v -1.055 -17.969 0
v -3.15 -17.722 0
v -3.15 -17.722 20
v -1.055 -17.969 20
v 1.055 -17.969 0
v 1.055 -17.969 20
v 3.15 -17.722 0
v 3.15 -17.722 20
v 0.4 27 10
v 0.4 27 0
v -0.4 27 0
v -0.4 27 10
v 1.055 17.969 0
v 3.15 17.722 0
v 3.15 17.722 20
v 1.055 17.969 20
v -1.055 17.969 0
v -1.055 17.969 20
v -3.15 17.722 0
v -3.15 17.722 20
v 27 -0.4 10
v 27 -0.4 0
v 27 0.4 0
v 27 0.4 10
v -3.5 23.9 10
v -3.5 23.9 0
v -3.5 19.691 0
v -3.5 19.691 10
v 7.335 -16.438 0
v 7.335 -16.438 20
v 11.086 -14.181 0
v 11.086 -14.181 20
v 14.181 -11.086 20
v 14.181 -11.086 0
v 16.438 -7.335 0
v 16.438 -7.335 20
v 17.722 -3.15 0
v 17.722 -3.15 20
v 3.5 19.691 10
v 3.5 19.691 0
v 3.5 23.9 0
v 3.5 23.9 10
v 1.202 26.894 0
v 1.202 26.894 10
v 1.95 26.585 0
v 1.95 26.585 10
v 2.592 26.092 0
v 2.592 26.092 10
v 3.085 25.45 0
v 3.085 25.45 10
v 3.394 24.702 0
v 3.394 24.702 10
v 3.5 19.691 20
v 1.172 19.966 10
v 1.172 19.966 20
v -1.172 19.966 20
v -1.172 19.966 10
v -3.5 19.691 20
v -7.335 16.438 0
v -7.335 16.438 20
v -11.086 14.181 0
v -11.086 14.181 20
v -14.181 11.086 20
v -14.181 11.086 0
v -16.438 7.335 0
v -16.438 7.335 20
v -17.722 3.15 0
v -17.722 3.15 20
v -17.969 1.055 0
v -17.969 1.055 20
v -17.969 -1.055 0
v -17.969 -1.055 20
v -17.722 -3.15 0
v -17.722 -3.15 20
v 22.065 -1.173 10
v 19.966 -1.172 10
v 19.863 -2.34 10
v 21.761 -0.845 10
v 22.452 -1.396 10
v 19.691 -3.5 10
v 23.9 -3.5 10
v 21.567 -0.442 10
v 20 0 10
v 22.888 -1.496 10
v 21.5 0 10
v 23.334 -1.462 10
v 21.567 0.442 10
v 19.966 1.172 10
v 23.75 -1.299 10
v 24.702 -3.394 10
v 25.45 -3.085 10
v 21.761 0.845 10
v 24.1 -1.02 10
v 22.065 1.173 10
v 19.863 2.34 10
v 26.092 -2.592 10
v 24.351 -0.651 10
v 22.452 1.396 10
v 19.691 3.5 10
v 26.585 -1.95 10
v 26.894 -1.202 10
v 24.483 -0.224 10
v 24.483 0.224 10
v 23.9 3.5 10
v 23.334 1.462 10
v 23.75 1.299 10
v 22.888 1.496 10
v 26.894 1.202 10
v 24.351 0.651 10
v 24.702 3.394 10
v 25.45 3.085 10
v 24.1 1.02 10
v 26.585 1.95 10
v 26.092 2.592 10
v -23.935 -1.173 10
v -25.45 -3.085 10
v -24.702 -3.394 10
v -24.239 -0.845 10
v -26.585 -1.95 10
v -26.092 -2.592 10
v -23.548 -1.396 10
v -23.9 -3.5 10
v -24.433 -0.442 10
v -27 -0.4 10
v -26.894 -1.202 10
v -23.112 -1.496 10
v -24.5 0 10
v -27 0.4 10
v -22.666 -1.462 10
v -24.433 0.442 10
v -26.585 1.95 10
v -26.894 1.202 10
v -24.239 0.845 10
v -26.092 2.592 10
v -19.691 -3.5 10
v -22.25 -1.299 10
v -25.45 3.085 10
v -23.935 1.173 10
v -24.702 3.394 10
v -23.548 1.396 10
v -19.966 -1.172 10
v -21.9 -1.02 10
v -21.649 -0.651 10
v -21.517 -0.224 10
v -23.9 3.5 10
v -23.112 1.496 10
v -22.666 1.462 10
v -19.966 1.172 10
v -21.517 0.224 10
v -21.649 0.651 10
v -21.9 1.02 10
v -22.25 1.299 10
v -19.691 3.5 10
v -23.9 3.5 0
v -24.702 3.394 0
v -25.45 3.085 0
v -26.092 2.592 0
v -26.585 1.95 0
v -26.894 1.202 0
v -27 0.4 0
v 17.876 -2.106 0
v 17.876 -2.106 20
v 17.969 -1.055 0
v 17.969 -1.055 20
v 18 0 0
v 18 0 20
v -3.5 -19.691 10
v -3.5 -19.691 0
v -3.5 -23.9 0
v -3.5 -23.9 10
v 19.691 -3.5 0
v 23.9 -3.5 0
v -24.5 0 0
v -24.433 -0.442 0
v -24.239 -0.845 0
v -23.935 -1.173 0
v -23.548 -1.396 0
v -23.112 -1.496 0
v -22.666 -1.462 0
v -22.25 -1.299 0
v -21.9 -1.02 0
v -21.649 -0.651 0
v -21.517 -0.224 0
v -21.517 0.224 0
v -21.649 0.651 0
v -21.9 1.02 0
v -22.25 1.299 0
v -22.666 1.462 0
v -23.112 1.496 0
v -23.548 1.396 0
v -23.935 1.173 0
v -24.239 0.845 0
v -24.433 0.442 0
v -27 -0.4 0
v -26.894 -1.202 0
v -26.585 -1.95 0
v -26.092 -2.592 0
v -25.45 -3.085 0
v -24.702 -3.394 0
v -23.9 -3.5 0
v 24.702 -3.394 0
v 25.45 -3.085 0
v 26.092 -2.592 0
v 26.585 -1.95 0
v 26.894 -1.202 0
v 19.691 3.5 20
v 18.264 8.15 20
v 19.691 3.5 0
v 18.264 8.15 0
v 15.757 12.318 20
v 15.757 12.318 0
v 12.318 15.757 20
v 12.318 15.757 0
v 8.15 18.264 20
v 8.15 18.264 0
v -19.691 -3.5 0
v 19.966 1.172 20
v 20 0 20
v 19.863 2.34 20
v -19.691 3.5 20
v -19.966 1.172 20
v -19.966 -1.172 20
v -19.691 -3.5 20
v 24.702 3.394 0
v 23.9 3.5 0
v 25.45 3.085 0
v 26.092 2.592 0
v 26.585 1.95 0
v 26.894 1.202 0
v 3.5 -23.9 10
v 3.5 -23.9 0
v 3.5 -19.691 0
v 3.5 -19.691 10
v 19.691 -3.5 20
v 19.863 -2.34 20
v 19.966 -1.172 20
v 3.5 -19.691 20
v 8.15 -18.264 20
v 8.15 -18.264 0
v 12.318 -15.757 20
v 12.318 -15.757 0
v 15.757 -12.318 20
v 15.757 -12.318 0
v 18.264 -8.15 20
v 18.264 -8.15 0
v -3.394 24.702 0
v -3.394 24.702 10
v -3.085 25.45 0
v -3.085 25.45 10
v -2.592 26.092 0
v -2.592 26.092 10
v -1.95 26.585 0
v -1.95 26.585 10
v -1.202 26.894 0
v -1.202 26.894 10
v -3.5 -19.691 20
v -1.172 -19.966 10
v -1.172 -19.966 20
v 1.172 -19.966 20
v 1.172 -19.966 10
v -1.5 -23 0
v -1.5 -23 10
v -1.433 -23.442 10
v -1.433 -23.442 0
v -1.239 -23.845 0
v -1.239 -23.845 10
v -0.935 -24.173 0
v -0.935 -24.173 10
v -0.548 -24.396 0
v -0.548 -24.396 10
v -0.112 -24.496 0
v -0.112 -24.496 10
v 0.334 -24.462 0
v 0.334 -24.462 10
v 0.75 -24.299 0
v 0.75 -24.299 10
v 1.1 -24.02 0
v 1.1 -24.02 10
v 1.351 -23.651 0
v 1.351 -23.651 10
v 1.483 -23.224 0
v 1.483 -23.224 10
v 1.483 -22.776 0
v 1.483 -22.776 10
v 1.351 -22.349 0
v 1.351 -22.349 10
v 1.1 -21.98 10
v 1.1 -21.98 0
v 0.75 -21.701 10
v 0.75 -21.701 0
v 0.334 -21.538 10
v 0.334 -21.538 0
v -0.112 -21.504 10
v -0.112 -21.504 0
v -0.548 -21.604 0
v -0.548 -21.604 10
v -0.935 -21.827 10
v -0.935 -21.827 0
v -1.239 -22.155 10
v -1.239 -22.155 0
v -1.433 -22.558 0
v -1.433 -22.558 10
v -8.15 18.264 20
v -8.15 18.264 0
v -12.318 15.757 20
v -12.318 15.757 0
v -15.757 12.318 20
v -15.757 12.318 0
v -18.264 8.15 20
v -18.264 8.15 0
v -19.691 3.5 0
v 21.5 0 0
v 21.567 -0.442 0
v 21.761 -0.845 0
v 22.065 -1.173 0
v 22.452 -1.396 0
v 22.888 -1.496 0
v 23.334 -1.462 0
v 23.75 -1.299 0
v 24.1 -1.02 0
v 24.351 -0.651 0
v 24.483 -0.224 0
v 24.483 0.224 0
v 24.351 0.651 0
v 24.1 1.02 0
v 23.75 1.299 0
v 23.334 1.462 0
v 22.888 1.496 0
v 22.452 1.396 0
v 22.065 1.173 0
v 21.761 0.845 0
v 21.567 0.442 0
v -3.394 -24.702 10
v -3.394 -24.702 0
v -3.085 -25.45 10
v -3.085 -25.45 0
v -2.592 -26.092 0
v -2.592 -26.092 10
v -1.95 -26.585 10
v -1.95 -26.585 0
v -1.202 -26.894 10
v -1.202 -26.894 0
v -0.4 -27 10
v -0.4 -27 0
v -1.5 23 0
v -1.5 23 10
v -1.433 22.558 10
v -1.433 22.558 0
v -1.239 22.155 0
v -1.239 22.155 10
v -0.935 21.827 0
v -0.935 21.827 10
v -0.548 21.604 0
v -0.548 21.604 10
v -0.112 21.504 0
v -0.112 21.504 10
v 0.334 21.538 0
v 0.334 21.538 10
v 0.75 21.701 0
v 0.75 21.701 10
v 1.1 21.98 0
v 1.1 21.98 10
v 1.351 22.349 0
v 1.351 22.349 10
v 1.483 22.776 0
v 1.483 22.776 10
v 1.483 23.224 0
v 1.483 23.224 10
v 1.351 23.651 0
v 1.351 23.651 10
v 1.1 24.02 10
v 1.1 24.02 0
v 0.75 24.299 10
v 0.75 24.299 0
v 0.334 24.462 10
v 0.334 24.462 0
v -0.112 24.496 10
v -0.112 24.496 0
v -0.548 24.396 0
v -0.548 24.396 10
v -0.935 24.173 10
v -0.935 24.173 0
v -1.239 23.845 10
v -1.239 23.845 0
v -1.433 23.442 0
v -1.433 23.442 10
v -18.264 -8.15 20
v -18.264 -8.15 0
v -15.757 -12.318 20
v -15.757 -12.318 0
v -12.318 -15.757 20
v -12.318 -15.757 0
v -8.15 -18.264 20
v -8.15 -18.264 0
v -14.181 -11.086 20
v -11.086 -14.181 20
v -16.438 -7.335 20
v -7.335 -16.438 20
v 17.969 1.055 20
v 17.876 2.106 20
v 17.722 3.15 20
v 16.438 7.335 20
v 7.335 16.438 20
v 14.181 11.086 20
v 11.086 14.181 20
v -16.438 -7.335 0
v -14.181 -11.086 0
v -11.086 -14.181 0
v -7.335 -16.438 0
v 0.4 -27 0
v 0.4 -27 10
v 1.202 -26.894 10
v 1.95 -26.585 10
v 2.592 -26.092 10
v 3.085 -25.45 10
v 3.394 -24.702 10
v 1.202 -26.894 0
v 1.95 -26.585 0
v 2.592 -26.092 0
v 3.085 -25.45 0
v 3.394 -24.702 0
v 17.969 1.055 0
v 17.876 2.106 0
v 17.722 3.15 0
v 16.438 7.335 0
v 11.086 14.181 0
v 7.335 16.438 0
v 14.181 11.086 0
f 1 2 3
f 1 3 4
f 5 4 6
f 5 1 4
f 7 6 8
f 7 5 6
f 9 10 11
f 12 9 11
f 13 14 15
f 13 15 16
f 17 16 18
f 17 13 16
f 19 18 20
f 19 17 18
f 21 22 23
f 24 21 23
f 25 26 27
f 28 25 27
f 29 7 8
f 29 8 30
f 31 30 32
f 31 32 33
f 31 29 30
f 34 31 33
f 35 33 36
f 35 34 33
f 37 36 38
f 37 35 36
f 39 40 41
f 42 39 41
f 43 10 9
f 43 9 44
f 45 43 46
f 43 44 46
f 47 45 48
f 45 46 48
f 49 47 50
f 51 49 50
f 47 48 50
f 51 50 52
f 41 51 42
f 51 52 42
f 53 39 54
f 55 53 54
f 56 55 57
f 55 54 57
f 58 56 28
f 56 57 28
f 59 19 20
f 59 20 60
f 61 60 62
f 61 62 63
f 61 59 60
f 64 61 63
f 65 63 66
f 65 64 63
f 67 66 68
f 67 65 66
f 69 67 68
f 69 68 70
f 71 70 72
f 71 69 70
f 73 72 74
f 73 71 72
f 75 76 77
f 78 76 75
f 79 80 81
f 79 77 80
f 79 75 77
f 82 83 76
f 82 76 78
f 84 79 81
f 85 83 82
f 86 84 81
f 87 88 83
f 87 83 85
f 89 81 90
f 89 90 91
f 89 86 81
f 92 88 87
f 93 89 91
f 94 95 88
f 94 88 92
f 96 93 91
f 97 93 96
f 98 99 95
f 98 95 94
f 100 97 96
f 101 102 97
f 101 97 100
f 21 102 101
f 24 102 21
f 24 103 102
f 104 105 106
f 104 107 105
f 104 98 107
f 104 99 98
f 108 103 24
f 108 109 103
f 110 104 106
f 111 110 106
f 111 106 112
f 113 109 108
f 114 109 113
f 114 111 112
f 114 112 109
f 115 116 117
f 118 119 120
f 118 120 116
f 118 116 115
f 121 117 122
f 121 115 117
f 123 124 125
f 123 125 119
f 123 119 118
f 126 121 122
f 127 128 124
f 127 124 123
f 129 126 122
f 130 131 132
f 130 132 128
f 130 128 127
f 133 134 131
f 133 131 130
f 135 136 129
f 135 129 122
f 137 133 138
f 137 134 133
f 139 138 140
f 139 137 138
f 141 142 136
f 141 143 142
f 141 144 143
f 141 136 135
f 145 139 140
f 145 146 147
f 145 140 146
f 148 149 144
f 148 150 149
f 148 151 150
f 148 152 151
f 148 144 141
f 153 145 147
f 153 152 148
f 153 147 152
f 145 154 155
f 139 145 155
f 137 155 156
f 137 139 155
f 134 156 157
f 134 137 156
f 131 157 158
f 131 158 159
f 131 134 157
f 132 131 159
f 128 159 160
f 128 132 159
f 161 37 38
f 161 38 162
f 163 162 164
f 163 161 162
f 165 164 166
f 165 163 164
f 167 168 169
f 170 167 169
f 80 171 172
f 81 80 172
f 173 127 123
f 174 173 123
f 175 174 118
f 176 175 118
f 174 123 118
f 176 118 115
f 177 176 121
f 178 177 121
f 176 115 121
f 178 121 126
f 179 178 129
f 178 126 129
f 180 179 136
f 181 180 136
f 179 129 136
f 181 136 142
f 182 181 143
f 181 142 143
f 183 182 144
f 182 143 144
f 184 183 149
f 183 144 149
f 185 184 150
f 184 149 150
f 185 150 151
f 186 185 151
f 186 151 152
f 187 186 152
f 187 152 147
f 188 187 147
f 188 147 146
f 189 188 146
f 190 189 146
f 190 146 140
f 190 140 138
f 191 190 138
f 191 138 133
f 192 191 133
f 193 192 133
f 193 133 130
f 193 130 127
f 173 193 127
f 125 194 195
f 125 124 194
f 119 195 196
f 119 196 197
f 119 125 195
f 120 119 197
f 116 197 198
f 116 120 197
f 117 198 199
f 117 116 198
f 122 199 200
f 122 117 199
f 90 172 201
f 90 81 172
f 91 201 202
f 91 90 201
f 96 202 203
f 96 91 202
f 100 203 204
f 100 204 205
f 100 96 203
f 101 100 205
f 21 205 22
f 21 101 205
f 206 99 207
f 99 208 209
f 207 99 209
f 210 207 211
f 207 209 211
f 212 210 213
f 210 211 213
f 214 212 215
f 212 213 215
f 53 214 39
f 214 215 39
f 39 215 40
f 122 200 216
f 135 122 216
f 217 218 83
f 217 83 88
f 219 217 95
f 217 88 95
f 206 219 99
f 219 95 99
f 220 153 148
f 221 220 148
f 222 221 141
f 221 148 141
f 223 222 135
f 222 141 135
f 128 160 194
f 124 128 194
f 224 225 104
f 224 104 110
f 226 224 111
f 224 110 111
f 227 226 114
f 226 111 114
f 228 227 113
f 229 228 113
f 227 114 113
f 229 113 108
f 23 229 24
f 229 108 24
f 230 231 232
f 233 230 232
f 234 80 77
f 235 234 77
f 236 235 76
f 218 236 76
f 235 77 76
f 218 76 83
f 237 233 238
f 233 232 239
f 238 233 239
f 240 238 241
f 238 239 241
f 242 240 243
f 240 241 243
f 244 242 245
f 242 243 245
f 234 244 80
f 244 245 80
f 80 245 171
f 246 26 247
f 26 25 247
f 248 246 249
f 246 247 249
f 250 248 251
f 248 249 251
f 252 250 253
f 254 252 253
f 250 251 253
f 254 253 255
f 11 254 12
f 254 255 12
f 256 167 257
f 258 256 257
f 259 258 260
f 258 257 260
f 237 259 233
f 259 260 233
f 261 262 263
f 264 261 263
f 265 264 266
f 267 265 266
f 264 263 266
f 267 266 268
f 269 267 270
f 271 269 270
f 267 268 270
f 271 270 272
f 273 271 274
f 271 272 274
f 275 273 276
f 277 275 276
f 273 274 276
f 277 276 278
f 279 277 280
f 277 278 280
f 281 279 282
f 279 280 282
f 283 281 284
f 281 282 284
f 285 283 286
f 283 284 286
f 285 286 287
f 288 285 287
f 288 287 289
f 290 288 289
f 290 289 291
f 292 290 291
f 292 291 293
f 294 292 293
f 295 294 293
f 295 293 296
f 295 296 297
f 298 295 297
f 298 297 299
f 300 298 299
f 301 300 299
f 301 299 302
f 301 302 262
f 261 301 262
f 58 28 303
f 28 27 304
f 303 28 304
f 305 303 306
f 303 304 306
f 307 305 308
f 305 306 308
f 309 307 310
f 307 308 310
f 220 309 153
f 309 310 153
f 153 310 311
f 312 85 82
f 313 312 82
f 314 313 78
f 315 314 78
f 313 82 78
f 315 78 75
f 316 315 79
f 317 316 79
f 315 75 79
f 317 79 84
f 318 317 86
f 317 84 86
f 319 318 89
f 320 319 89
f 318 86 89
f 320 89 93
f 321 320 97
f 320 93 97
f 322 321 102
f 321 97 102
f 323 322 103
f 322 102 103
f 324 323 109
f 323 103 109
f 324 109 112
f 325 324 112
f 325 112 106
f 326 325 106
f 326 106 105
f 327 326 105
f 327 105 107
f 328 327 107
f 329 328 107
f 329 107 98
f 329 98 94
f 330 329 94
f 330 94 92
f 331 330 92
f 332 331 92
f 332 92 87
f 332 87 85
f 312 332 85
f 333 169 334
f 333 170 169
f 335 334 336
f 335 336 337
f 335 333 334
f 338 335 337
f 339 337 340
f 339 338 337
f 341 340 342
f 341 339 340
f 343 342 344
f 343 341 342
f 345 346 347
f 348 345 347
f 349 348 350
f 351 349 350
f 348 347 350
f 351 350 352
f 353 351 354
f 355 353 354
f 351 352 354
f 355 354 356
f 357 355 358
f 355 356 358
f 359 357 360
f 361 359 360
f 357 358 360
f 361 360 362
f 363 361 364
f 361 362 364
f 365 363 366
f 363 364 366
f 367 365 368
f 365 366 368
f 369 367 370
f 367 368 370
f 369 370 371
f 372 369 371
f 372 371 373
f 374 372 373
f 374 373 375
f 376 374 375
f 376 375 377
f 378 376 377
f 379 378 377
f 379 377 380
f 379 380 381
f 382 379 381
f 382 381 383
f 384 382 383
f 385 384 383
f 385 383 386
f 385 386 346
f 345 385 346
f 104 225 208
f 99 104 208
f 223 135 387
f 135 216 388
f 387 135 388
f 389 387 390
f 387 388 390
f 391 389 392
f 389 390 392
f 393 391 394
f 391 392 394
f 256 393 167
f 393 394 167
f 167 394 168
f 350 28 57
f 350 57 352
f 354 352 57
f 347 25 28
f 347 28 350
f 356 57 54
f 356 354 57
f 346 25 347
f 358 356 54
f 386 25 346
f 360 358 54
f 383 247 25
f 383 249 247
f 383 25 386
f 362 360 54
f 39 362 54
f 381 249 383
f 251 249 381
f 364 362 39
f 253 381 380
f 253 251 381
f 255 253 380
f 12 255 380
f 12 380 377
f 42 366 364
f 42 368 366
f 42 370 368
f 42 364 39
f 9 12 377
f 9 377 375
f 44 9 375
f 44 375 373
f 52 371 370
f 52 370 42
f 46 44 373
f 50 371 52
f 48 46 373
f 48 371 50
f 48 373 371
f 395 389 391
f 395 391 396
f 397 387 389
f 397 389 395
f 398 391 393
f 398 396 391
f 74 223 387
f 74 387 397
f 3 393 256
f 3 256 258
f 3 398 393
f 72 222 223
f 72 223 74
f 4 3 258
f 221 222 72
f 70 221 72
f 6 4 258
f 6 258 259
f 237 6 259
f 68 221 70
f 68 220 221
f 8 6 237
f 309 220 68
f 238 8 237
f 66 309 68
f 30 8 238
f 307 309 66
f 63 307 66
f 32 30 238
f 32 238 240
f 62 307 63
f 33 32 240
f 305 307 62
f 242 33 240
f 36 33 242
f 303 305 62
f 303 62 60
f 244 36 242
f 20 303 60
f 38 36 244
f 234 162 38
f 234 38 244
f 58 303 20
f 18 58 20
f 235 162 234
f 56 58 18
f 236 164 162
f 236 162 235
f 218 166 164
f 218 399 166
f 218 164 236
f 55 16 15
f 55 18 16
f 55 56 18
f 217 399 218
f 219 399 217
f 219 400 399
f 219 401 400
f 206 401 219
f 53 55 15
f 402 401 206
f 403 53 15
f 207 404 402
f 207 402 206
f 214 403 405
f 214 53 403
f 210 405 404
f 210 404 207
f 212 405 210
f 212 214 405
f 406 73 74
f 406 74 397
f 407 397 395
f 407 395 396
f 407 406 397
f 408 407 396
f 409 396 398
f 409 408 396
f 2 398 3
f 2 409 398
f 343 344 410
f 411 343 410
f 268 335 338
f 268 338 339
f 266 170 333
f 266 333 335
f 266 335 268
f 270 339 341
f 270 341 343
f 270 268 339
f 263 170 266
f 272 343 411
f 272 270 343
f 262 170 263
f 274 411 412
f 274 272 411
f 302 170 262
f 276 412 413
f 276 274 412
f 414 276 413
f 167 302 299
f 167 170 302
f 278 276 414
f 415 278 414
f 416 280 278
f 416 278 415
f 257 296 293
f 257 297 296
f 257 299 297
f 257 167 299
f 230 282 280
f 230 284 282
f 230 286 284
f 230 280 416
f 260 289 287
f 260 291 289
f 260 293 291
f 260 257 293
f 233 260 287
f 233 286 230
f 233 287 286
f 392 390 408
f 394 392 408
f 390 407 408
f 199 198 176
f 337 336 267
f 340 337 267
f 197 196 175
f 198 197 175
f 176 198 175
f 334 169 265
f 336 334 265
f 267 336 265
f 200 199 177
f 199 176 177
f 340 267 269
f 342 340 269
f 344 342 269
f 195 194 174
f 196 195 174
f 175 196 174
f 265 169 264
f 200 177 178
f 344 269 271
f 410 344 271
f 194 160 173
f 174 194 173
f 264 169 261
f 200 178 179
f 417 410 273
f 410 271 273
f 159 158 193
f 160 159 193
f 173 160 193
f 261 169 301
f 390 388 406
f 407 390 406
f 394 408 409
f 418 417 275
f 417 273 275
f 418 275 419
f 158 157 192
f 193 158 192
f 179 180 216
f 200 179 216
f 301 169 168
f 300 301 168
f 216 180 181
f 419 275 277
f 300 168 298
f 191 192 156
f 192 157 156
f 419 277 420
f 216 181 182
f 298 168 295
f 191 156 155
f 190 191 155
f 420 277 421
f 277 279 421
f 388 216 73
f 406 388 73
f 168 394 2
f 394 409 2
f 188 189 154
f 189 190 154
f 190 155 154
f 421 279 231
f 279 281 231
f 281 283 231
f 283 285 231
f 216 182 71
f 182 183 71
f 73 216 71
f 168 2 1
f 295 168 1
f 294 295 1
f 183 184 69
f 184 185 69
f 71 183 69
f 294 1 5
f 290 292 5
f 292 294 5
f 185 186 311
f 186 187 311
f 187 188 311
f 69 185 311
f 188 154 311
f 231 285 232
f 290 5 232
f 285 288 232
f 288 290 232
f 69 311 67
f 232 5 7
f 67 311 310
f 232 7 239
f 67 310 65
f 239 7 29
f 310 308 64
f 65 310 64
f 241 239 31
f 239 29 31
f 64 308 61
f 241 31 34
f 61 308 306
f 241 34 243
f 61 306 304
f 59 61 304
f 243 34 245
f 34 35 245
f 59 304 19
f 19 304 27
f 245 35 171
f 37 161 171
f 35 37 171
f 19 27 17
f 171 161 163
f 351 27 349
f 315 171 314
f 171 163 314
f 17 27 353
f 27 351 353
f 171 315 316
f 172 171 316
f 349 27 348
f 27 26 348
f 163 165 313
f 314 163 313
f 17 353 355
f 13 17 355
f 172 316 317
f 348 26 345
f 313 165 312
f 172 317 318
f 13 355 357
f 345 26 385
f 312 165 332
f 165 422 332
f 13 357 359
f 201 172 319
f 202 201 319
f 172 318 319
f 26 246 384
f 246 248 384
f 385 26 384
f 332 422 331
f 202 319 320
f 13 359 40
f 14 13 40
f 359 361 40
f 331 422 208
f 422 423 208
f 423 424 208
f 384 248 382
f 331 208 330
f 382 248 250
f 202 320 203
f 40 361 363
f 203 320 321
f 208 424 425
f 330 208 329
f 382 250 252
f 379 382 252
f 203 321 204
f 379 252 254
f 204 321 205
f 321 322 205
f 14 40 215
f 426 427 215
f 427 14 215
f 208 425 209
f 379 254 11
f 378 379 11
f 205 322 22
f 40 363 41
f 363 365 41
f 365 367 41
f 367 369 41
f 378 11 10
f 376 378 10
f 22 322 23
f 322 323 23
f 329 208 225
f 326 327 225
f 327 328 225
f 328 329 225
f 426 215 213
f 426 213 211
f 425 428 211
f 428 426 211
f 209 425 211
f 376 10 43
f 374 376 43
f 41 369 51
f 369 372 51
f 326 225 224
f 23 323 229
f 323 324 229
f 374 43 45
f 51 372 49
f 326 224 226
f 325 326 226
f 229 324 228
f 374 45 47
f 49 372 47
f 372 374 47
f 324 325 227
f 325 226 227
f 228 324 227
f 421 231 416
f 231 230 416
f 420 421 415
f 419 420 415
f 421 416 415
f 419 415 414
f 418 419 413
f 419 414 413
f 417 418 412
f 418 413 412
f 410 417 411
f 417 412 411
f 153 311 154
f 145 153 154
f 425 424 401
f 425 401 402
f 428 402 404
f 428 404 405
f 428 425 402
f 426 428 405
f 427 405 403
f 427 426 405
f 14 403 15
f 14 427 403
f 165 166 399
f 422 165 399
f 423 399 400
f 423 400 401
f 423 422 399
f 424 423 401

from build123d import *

# Parameters (mm, degrees)
F1_DEPTH = 20
F2_T     = -2
F3_DEPTH = 10
F4_R     = 3.1
F5_D     = 3


with BuildPart() as f1:
    # F0 (on Top) → F1 (new body)
    with BuildSketch(Plane.XY):
        with BuildLine():
            ThreePointArc((19.691369, -3.5), (19.922693, -1.756791), (20, 0))
            ThreePointArc((20, 0), (19.922693, 1.756791), (19.691369, 3.5))
            ThreePointArc((19.691369, 3.5), (14.142136, 14.142136), (3.5, 19.691369))
            ThreePointArc((3.5, 19.691369), (0, 20), (-3.5, 19.691369))
            ThreePointArc((-3.5, 19.691369), (-14.142136, 14.142136), (-19.691369, 3.5))
            ThreePointArc((-19.691369, 3.5), (-20, 0), (-19.691369, -3.5))
            ThreePointArc((-19.691369, -3.5), (-14.142136, -14.142136), (-3.5, -19.691369))
            ThreePointArc((-3.5, -19.691369), (0, -20), (3.5, -19.691369))
            ThreePointArc((3.5, -19.691369), (14.142136, -14.142136), (19.691369, -3.5))
        make_face()
    extrude(amount=F1_DEPTH)

    # F2
    f2_openings = [f1.faces().sort_by_distance(p)[0] for p in [
        (0, 0, 20),
        (0, 0, 0),
    ]]
    offset(amount=F2_T, openings=f2_openings)

    # F0 (on Top) → F3 (join)
    with BuildSketch(Plane.XY):
        with BuildLine():
            ThreePointArc((-19.691369, -3.5), (-20, 0), (-19.691369, 3.5))
            Line((-19.691369, 3.5), (-27, 3.5))
            Line((-27, 3.5), (-27, -3.5))
            Line((-27, -3.5), (-19.691369, -3.5))
        make_face()
        with BuildLine():
            ThreePointArc((-3.5, 19.691369), (0, 20), (3.5, 19.691369))
            Line((3.5, 19.691369), (3.5, 27))
            Line((3.5, 27), (-3.5, 27))
            Line((-3.5, 27), (-3.5, 19.691369))
        make_face()
        with BuildLine():
            ThreePointArc((19.691369, 3.5), (19.922693, 1.756791), (20, 0))
            ThreePointArc((20, 0), (19.922693, -1.756791), (19.691369, -3.5))
            Line((19.691369, -3.5), (27, -3.5))
            Line((27, -3.5), (27, 3.5))
            Line((27, 3.5), (19.691369, 3.5))
        make_face()
        with BuildLine():
            Line((3.5, -27), (3.5, -19.691369))
            ThreePointArc((3.5, -19.691369), (0, -20), (-3.5, -19.691369))
            Line((-3.5, -19.691369), (-3.5, -27))
            Line((-3.5, -27), (3.5, -27))
        make_face()
    extrude(amount=F3_DEPTH)

    # F4
    f4_edges = [f1.edges().sort_by_distance(p)[0] for p in [
        (27, 3.5, 5),
        (27, -3.5, 5),
        (3.5, 27, 5),
        (3.5, -27, 5),
        (-27, -3.5, 5),
        (-3.5, -27, 5),
        (-27, 3.5, 5),
        (-3.5, 27, 5),
    ]]
    fillet(f4_edges, radius=F4_R)

    # F5 (through all)
    with Locations(Plane(origin=(0, 0, 0), x_dir=(1, 0, 0), z_dir=(0, 0, -1))):
        with Locations((23, 0), (0, -23), (-23, 0), (0, 23)):
            Hole(F5_D / 2)


solid = f1.part
